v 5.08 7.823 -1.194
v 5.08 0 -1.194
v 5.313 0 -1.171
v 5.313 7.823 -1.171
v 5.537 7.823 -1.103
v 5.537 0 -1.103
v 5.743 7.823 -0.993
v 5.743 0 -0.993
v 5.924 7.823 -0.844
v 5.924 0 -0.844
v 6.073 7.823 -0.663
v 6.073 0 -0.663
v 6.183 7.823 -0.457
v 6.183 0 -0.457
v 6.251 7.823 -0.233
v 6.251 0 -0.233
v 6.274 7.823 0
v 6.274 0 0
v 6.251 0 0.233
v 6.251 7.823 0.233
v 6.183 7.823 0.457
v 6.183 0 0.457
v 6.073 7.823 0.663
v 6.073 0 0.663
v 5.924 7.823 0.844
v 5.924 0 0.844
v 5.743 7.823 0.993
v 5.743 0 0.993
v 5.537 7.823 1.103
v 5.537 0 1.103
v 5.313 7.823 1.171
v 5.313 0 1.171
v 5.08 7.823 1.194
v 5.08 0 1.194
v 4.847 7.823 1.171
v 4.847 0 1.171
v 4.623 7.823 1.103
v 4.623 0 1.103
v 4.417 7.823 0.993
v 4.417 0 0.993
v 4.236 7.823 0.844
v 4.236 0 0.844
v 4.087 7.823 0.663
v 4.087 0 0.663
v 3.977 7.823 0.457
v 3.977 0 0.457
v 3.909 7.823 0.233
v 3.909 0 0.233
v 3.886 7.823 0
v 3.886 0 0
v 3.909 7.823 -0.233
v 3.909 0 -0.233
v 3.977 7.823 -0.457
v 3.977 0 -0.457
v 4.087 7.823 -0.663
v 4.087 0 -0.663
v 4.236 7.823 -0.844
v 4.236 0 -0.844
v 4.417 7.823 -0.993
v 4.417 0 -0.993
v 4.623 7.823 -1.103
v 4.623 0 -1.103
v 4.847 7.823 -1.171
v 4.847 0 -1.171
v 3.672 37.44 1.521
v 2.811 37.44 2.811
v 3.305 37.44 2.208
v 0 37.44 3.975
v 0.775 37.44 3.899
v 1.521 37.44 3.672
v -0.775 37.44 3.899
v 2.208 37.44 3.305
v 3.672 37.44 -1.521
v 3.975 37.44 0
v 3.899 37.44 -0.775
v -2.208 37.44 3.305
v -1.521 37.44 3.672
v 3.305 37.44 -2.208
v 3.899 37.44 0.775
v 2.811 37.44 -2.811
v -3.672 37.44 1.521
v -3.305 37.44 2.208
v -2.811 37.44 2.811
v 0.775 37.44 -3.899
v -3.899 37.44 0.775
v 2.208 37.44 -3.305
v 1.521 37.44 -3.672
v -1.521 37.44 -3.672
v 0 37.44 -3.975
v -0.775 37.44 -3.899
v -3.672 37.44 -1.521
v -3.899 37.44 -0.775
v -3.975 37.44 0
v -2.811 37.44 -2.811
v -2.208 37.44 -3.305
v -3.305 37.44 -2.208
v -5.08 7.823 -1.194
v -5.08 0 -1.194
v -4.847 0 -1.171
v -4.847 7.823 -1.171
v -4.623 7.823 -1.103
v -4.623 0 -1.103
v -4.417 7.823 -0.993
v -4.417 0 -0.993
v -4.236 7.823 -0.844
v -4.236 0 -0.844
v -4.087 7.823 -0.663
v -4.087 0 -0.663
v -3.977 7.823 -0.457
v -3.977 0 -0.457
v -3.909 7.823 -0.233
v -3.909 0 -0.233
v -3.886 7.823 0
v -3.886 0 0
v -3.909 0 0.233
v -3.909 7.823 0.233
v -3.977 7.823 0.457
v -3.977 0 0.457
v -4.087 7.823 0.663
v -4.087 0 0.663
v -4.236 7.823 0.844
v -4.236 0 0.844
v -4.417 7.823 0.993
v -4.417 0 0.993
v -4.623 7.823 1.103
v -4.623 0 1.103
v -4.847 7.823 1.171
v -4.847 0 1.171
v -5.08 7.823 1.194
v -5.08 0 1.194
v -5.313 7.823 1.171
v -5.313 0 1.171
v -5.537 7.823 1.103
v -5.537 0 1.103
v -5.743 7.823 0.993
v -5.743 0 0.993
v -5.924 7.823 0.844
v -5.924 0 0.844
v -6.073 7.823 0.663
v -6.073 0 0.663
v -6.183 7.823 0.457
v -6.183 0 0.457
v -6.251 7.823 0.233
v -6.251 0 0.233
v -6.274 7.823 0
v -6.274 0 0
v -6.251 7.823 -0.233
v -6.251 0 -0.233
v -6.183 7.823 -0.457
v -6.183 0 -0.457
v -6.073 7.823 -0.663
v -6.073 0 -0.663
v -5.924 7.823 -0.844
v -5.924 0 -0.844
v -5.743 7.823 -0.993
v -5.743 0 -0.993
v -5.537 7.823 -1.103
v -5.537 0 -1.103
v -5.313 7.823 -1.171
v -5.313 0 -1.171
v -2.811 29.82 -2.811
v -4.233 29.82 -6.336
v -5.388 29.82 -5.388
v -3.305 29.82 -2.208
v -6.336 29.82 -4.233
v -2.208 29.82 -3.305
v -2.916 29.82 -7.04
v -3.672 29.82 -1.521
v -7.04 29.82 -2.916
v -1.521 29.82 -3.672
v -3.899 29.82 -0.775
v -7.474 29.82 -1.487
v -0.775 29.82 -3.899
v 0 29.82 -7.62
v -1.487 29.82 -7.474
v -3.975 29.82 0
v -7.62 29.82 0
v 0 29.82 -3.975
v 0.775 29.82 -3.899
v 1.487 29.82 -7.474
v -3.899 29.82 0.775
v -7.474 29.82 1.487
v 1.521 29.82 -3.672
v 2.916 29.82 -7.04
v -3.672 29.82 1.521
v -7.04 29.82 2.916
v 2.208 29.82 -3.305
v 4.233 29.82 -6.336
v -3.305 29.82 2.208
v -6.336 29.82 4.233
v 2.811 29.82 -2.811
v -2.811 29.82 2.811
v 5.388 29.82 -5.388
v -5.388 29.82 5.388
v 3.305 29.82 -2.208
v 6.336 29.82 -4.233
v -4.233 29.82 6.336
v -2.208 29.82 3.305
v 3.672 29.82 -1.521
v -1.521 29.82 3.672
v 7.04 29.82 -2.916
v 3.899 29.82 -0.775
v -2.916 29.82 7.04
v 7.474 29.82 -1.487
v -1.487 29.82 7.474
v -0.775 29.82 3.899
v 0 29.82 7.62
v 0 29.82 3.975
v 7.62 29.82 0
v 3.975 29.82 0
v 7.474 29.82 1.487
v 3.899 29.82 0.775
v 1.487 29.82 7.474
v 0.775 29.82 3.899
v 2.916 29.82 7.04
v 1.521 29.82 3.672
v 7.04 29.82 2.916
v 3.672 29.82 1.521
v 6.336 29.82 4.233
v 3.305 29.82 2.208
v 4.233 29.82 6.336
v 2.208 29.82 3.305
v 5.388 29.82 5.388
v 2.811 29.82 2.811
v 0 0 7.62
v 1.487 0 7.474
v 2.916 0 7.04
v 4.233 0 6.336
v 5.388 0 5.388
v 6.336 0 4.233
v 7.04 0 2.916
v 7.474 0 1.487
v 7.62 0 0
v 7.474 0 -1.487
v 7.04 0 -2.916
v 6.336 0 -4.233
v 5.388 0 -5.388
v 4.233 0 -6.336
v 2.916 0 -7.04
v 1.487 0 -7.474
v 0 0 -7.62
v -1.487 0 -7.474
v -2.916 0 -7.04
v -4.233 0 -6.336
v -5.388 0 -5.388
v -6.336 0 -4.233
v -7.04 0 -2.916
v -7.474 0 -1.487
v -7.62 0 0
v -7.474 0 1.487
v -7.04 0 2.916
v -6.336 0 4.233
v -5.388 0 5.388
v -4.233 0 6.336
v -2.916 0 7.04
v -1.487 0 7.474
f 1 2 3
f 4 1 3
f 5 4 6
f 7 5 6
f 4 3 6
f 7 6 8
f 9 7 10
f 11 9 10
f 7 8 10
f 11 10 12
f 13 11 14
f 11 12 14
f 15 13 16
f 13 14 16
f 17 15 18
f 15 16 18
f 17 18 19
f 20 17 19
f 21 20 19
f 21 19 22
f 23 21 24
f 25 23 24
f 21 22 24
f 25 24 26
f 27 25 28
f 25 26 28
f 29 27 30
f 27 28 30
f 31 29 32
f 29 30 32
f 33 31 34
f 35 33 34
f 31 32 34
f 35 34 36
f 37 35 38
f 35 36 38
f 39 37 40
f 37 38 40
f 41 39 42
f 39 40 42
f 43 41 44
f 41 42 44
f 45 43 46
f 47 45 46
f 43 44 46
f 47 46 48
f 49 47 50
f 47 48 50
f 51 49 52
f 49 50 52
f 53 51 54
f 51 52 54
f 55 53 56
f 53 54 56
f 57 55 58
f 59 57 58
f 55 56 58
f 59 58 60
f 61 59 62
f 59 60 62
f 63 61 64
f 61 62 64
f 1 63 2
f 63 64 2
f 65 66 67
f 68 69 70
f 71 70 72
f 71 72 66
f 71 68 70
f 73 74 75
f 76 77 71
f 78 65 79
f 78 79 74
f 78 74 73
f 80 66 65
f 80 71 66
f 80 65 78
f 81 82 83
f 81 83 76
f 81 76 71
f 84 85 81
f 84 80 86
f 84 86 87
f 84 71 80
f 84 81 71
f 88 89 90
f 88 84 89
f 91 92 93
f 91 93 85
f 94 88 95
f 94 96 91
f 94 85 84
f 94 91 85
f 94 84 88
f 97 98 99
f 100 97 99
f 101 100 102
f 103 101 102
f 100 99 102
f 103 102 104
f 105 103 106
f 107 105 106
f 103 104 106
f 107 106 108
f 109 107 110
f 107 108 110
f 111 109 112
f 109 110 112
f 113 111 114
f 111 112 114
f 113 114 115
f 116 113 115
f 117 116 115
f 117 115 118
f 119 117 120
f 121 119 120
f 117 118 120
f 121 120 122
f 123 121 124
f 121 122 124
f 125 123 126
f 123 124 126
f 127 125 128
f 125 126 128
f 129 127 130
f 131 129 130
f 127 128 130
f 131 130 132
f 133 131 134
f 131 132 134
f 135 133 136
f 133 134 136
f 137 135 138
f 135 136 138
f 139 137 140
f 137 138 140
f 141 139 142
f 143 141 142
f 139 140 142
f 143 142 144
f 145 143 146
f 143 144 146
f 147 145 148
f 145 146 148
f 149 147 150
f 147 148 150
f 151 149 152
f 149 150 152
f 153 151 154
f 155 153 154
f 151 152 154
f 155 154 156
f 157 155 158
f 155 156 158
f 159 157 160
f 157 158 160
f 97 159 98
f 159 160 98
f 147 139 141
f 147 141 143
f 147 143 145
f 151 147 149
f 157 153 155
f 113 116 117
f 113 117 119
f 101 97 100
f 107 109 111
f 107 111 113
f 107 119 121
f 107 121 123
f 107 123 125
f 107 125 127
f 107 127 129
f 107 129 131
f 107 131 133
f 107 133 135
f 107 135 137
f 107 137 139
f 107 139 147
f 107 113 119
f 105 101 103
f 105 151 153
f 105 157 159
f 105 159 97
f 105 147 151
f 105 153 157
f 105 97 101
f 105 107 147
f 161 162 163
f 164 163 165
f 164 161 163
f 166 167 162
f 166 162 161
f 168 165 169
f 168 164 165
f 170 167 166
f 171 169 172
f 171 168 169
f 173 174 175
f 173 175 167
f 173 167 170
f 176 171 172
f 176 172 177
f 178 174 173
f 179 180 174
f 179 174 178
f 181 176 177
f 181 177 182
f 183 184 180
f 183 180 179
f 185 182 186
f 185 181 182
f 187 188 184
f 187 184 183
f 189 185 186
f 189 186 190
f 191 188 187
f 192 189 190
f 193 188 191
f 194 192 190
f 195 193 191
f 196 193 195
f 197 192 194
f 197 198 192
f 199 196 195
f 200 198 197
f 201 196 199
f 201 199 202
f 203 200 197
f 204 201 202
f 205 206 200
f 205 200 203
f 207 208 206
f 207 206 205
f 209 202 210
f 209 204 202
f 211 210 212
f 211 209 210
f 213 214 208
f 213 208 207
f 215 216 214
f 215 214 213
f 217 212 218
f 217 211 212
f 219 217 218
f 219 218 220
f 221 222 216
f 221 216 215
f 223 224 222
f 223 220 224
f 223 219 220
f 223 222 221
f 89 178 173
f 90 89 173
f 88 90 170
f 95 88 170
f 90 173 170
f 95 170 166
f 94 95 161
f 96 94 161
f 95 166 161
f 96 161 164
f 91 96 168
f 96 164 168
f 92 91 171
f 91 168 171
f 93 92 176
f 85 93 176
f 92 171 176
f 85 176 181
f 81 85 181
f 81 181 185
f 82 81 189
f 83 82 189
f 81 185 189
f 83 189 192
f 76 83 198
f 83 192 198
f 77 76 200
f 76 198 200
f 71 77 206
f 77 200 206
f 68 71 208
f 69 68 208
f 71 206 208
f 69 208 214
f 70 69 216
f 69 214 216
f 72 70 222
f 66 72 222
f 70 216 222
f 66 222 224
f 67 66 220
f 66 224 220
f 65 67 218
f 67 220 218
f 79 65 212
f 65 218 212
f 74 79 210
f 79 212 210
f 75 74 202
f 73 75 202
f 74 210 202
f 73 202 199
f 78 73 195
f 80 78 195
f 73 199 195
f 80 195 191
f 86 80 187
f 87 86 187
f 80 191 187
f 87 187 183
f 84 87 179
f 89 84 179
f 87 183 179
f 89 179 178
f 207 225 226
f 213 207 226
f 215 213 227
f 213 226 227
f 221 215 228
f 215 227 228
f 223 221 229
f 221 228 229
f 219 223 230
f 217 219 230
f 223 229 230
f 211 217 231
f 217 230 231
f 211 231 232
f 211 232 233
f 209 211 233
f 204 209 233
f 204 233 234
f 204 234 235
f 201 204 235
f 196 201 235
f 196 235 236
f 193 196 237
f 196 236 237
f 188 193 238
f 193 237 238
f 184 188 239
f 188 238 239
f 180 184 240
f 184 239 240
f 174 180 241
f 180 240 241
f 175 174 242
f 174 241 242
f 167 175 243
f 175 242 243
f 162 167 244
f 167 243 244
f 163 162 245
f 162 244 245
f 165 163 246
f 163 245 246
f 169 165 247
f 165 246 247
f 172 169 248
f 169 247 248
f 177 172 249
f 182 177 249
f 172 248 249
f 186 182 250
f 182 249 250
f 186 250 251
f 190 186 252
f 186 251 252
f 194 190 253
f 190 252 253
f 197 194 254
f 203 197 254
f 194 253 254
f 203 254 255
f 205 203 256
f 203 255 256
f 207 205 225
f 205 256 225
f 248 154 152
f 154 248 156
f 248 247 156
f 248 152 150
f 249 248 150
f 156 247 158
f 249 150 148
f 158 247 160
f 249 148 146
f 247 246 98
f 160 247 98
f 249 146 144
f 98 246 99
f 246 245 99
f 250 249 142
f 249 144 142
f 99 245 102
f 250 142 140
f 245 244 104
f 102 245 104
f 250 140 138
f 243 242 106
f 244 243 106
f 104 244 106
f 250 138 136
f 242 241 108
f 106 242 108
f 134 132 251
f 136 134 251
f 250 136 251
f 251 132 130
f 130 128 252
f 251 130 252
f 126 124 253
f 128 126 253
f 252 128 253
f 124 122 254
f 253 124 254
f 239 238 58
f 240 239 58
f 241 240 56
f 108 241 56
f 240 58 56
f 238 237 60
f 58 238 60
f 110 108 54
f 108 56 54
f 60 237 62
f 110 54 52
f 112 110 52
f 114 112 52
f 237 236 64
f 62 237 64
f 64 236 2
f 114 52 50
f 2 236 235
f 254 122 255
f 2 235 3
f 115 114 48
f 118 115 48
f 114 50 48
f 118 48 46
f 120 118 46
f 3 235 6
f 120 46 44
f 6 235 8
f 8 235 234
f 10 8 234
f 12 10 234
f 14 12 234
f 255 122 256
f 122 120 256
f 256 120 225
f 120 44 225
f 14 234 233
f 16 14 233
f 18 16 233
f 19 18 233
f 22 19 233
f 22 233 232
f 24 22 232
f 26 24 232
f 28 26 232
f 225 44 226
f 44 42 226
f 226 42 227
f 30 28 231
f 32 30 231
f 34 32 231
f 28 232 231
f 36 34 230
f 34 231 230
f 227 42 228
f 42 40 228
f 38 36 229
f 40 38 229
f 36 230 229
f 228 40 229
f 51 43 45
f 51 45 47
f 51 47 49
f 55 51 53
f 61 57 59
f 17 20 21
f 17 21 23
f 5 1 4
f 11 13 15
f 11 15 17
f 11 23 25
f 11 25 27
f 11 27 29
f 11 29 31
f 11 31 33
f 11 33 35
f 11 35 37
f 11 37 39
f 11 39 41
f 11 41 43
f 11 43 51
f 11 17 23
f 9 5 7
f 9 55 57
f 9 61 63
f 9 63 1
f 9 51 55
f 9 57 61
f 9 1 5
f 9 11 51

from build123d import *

# Parameters (mm, degrees)
SKETCH1_R           = 7.62
BOSS_EXTRUDE1_DEPTH = 29.8196
SKETCH2_R           = 3.975
BOSS_EXTRUDE2_DEPTH = 7.62
SKETCH3_R           = 1.1938
CUT_EXTRUDE1_DEPTH  = 7.8232


with BuildPart() as part:
    # Sketch1 → Boss-Extrude1 (new body)
    with BuildSketch(Plane(origin=(0, 0, 0), x_dir=(1, 0, 0), z_dir=(0, 1, 0))):
        with Locations(Location((0, 0, 0), (0, 0, 270))):
            Circle(SKETCH1_R)
    extrude(amount=BOSS_EXTRUDE1_DEPTH)

    # Sketch2 → Boss-Extrude2 (add)
    with BuildSketch(Plane(origin=(0, 29.8196, 0), x_dir=(1, 0, 0), z_dir=(0, 1, 0))):
        with Locations(Location((0, 0, 0), (0, 0, 90))):
            Circle(SKETCH2_R)
    extrude(amount=BOSS_EXTRUDE2_DEPTH)

    # Sketch3 → Cut-Extrude1 (cut)
    with BuildSketch(Plane.XZ):
        with Locations(Location((-5.08, 0, 0), (0, 0, 270))):
            Circle(SKETCH3_R)
        with Locations(Location((5.08, 0, 0), (0, 0, 270))):
            Circle(SKETCH3_R)
    extrude(amount=-CUT_EXTRUDE1_DEPTH, mode=Mode.SUBTRACT)


solid = part.part
